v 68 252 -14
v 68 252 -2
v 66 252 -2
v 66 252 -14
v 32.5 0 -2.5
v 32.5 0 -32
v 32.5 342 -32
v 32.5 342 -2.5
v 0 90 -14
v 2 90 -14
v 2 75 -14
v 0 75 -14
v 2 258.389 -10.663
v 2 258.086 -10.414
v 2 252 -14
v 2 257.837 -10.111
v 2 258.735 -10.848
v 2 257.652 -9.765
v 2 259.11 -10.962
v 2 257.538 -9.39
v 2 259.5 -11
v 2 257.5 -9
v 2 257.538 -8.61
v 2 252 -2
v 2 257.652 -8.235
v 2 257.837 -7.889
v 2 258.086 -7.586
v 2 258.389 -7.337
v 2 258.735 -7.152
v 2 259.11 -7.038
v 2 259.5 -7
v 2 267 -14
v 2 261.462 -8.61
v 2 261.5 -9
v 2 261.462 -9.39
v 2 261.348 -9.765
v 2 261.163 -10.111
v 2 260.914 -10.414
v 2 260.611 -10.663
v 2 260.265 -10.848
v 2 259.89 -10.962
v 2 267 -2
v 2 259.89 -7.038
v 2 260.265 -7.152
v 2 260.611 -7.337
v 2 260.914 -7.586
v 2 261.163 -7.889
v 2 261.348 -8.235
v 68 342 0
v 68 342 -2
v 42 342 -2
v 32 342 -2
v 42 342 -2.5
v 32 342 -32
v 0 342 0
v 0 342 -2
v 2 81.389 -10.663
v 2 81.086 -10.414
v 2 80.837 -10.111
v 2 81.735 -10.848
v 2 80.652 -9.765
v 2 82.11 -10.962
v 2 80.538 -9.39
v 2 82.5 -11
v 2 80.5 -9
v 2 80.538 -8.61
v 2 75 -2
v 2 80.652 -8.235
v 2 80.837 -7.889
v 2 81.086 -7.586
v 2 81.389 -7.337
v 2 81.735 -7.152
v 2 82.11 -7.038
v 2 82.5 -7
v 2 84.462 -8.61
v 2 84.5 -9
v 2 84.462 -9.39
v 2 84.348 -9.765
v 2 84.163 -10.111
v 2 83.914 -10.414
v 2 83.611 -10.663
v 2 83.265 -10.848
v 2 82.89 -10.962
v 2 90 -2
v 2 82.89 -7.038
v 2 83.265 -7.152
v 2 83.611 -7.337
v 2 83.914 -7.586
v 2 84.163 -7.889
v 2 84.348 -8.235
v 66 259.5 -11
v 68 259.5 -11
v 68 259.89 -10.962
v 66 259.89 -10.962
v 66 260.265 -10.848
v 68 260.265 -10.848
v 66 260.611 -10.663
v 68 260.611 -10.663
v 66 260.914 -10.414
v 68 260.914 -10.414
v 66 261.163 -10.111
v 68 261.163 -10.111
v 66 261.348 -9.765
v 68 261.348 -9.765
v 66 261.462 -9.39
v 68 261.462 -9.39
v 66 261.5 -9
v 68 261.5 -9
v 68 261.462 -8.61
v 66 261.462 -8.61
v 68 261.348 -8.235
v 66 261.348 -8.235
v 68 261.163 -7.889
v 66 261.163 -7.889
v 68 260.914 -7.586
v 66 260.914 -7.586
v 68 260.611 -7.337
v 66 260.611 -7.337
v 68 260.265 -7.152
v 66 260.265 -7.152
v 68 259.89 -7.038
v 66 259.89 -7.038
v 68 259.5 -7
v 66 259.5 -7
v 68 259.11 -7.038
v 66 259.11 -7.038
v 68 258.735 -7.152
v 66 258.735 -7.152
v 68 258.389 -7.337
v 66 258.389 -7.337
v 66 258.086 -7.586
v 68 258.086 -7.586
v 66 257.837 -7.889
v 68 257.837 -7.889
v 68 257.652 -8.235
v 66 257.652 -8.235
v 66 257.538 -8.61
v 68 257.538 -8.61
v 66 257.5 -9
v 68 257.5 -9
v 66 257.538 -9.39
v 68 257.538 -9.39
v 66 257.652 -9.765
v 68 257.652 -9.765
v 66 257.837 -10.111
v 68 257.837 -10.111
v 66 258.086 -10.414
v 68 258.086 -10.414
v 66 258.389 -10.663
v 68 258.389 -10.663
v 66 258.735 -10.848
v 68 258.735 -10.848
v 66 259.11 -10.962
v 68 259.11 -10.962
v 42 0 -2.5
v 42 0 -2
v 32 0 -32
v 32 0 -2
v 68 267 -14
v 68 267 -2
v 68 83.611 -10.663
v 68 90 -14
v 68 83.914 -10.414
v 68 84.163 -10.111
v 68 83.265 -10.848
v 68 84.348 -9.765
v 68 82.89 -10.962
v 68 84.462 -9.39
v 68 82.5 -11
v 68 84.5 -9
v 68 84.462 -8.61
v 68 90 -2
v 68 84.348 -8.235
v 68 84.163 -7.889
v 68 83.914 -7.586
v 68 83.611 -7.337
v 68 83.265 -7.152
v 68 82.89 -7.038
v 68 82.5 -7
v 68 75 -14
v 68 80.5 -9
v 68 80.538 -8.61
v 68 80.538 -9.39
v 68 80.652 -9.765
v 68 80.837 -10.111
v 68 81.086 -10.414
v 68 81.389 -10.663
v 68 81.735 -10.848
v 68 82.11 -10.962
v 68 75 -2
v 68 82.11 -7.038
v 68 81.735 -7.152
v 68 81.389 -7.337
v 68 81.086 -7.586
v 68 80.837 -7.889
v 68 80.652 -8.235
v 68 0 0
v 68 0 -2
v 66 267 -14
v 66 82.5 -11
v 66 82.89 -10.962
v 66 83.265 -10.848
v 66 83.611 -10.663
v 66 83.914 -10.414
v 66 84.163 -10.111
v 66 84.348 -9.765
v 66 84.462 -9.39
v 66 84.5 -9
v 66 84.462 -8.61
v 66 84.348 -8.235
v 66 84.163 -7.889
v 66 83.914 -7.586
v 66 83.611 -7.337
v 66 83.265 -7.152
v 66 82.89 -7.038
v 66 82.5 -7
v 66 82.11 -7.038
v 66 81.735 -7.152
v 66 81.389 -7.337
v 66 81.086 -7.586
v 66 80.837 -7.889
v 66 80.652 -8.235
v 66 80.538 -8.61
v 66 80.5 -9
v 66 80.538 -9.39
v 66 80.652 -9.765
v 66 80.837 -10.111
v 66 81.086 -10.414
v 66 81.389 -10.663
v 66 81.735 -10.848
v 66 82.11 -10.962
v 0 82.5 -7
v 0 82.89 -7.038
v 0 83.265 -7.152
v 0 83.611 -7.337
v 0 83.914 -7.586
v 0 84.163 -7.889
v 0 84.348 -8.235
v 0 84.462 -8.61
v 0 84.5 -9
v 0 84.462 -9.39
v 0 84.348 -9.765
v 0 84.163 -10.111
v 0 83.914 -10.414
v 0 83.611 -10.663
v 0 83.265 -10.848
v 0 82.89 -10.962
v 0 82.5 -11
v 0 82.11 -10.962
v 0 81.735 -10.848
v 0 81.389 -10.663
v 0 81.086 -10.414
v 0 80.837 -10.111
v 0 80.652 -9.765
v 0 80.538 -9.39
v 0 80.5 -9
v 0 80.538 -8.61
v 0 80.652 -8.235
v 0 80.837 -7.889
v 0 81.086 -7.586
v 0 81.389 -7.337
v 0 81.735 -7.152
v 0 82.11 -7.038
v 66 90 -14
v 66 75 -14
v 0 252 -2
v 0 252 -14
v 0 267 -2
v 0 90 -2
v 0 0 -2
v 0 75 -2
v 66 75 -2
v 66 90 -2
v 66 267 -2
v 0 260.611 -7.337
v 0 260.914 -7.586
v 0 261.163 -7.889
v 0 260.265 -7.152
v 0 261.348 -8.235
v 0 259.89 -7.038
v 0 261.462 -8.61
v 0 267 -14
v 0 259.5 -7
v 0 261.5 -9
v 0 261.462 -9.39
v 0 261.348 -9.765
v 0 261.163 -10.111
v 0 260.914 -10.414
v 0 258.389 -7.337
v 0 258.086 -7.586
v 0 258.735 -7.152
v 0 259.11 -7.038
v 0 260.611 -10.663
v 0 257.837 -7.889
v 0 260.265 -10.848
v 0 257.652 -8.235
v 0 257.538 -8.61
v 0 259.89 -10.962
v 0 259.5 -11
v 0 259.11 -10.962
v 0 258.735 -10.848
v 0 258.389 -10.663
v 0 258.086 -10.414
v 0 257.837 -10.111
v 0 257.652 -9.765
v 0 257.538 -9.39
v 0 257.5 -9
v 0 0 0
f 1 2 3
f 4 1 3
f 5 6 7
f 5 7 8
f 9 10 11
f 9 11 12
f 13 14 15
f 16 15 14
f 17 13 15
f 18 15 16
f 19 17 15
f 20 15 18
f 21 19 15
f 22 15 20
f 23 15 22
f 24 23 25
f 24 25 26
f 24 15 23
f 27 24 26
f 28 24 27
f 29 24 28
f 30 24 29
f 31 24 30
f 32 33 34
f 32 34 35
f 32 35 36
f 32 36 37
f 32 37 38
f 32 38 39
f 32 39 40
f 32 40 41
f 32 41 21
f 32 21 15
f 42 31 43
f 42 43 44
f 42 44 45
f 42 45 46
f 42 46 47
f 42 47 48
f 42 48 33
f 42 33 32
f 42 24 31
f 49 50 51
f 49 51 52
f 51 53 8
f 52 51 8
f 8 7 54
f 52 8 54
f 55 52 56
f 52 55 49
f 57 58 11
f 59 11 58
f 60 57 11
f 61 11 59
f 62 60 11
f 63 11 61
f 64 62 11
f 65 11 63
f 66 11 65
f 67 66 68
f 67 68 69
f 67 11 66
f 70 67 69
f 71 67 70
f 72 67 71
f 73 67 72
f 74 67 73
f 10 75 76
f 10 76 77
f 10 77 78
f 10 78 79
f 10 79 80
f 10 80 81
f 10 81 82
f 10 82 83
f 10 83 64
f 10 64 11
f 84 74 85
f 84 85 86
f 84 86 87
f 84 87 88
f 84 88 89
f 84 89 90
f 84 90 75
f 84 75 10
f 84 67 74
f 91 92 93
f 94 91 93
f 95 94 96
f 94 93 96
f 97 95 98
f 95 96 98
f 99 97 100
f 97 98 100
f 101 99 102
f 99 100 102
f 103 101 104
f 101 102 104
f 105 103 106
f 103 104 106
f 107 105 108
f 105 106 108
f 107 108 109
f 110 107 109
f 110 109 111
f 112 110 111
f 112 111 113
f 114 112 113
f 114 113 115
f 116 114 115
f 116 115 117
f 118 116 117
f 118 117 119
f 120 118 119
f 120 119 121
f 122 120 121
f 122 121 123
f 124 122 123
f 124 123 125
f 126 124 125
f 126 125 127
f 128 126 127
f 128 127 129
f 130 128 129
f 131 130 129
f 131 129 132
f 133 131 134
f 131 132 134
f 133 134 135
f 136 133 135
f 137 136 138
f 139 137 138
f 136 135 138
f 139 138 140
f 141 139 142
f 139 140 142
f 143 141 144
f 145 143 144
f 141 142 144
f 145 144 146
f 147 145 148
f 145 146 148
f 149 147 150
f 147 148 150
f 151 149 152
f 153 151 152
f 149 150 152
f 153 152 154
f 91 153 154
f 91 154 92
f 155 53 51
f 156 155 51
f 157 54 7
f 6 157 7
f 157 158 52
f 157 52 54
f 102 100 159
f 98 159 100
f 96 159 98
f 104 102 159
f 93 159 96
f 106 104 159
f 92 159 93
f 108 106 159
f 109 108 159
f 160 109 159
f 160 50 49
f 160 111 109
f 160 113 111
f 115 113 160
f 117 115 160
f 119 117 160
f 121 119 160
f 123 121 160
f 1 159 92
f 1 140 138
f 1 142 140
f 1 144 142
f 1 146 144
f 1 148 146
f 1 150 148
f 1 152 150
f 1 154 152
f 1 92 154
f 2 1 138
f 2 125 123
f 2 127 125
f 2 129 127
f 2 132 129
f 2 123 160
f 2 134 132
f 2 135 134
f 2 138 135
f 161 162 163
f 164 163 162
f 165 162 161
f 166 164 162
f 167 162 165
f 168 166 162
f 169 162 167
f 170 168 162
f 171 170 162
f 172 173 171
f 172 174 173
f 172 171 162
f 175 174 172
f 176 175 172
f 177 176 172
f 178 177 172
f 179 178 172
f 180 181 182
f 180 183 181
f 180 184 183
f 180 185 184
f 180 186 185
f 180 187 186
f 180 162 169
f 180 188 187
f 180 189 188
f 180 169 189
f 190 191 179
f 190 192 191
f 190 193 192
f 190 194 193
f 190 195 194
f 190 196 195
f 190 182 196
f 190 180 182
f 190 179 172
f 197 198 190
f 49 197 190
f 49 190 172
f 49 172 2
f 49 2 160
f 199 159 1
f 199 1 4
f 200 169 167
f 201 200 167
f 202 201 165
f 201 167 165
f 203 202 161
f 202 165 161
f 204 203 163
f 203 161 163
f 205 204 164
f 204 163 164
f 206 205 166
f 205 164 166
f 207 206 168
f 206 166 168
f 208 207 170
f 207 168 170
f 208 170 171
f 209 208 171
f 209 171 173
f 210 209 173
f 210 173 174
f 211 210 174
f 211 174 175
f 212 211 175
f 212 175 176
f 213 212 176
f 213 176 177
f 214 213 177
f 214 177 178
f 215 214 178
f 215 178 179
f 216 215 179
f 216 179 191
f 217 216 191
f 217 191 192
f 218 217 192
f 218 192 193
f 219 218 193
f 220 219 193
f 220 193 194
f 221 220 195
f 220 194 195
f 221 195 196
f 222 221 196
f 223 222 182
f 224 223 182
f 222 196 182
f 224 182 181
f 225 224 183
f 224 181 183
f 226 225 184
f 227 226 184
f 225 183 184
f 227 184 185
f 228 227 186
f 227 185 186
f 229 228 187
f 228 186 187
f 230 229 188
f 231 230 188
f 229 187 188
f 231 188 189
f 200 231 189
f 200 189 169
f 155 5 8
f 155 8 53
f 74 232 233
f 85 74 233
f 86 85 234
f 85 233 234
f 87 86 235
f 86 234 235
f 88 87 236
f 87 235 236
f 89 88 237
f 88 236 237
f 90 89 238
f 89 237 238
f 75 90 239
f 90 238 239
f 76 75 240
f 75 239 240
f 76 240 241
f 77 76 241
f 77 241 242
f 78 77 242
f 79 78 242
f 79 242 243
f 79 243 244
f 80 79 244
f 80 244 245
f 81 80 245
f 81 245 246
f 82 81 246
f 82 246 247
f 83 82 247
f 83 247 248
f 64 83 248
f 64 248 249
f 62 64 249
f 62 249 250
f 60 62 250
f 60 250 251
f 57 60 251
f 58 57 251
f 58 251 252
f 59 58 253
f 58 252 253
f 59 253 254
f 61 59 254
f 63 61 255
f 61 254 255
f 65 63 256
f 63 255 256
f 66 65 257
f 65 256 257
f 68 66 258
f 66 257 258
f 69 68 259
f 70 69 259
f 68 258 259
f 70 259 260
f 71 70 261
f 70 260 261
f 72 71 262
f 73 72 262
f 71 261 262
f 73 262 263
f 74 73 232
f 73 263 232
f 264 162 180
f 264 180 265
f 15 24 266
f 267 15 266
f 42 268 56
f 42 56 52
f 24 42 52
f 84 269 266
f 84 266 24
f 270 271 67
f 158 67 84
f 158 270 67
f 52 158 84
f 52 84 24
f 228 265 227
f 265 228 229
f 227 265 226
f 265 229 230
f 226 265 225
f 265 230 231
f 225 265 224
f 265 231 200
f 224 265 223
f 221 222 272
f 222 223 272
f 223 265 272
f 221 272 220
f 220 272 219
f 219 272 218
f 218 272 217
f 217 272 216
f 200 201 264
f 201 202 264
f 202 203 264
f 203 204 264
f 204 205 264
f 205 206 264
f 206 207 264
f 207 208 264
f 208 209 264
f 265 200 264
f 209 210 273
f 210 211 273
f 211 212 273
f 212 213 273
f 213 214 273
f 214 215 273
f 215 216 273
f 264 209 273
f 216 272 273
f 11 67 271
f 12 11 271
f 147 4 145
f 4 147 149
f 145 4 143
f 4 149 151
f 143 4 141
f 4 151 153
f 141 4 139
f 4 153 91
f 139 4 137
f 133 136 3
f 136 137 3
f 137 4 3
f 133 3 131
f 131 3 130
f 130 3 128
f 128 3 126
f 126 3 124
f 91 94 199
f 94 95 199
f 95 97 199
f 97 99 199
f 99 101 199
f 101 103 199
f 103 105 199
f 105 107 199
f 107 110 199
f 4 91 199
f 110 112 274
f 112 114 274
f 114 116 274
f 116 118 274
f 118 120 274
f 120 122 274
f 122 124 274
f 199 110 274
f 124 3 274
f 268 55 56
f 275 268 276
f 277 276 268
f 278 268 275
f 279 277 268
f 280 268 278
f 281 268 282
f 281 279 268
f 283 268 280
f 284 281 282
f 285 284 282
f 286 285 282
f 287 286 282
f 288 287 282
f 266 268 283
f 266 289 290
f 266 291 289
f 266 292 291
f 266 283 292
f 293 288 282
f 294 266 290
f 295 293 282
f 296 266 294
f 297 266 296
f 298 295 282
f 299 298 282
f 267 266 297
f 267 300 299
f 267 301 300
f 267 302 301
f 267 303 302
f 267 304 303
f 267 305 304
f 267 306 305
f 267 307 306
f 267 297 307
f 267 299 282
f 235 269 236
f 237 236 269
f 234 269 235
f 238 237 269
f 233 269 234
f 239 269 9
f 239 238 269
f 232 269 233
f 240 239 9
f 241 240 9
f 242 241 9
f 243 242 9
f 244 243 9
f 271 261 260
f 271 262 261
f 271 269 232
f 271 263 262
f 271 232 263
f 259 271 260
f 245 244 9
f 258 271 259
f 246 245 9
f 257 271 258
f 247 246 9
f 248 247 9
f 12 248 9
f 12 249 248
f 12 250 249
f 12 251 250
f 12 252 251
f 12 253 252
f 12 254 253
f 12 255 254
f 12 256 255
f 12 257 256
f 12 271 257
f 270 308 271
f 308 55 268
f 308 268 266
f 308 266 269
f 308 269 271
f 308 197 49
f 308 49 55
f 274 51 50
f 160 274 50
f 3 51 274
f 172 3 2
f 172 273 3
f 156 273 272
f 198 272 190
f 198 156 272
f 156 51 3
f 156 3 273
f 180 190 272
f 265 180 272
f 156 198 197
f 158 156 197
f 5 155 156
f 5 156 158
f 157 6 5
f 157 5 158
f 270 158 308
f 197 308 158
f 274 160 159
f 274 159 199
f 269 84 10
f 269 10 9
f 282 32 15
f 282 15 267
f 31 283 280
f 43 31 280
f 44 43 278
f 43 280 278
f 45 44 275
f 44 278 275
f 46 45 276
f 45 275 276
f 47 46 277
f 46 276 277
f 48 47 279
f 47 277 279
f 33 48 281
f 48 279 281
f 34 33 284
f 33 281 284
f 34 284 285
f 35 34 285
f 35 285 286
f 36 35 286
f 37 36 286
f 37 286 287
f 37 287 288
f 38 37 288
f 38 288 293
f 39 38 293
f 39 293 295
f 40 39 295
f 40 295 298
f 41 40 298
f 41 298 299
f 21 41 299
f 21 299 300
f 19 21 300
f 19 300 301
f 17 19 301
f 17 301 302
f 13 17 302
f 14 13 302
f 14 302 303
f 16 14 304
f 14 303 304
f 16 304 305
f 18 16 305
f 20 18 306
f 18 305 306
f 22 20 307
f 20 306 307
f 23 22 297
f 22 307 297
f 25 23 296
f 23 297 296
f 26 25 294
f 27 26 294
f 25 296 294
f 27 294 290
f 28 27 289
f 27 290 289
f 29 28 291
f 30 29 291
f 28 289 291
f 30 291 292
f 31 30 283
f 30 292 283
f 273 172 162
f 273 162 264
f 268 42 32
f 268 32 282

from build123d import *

# Parameters (mm, degrees)
DODANIE_WYCI_GNI_CIE1_DEPTH = 342
SZKIC3_W                    = 2
SZKIC3_H                    = 15
DODANIE_WYCI_GNI_CIE2_DEPTH = 12
SZKIC4_R                    = 2
WYTNIJ_WYCI_GNI_CIE1_DEPTH  = 10
SZKIC5_R                    = 2
WYTNIJ_WYCI_GNI_CIE2_DEPTH  = 10


with BuildPart() as part:
    # Szkic1 → Dodanie-wyciągnięcie1 (new body)
    with BuildSketch(Plane(origin=(0, 0, 0), x_dir=(1, 0, 0), z_dir=(0, 1, 0))):
        Polygon((0, 0), (0, 2), (32, 2), (32, 32), (32.5, 32), (32.5, 2.5), (42, 2.5), (42, 2), (68, 2), (68, 0), align=None)
    extrude(amount=DODANIE_WYCI_GNI_CIE1_DEPTH)

    # Szkic3 → Dodanie-wyciągnięcie2 (add)
    with BuildSketch(Plane(origin=(0, 0, -2), x_dir=(-1, 0, 0), z_dir=(0, 0, -1))):
        with Locations((-67, 82.5)):
            Rectangle(SZKIC3_W, SZKIC3_H)
        with Locations((-67, 259.5)):
            Rectangle(SZKIC3_W, SZKIC3_H)
        with Locations((-1, 82.5)):
            Rectangle(SZKIC3_W, SZKIC3_H)
        with Locations((-1, 259.5)):
            Rectangle(SZKIC3_W, SZKIC3_H)
    extrude(amount=DODANIE_WYCI_GNI_CIE2_DEPTH)

    # Szkic4 → Wytnij-wyciągnięcie1 (cut)
    with BuildSketch(Plane.ZY):
        with Locations((-9, 82.5)):
            Circle(SZKIC4_R)
        with Locations((-9, 259.5)):
            Circle(SZKIC4_R)
    extrude(amount=-WYTNIJ_WYCI_GNI_CIE1_DEPTH, mode=Mode.SUBTRACT)

    # Szkic5 → Wytnij-wyciągnięcie2 (cut)
    with BuildSketch(Plane(origin=(68, 0, 0), x_dir=(0, 0, -1), z_dir=(1, 0, 0))):
        with Locations((9, 259.5)):
            Circle(SZKIC5_R)
        with Locations((9, 82.5)):
            Circle(SZKIC5_R)
    extrude(amount=-WYTNIJ_WYCI_GNI_CIE2_DEPTH, mode=Mode.SUBTRACT)


solid = part.part
